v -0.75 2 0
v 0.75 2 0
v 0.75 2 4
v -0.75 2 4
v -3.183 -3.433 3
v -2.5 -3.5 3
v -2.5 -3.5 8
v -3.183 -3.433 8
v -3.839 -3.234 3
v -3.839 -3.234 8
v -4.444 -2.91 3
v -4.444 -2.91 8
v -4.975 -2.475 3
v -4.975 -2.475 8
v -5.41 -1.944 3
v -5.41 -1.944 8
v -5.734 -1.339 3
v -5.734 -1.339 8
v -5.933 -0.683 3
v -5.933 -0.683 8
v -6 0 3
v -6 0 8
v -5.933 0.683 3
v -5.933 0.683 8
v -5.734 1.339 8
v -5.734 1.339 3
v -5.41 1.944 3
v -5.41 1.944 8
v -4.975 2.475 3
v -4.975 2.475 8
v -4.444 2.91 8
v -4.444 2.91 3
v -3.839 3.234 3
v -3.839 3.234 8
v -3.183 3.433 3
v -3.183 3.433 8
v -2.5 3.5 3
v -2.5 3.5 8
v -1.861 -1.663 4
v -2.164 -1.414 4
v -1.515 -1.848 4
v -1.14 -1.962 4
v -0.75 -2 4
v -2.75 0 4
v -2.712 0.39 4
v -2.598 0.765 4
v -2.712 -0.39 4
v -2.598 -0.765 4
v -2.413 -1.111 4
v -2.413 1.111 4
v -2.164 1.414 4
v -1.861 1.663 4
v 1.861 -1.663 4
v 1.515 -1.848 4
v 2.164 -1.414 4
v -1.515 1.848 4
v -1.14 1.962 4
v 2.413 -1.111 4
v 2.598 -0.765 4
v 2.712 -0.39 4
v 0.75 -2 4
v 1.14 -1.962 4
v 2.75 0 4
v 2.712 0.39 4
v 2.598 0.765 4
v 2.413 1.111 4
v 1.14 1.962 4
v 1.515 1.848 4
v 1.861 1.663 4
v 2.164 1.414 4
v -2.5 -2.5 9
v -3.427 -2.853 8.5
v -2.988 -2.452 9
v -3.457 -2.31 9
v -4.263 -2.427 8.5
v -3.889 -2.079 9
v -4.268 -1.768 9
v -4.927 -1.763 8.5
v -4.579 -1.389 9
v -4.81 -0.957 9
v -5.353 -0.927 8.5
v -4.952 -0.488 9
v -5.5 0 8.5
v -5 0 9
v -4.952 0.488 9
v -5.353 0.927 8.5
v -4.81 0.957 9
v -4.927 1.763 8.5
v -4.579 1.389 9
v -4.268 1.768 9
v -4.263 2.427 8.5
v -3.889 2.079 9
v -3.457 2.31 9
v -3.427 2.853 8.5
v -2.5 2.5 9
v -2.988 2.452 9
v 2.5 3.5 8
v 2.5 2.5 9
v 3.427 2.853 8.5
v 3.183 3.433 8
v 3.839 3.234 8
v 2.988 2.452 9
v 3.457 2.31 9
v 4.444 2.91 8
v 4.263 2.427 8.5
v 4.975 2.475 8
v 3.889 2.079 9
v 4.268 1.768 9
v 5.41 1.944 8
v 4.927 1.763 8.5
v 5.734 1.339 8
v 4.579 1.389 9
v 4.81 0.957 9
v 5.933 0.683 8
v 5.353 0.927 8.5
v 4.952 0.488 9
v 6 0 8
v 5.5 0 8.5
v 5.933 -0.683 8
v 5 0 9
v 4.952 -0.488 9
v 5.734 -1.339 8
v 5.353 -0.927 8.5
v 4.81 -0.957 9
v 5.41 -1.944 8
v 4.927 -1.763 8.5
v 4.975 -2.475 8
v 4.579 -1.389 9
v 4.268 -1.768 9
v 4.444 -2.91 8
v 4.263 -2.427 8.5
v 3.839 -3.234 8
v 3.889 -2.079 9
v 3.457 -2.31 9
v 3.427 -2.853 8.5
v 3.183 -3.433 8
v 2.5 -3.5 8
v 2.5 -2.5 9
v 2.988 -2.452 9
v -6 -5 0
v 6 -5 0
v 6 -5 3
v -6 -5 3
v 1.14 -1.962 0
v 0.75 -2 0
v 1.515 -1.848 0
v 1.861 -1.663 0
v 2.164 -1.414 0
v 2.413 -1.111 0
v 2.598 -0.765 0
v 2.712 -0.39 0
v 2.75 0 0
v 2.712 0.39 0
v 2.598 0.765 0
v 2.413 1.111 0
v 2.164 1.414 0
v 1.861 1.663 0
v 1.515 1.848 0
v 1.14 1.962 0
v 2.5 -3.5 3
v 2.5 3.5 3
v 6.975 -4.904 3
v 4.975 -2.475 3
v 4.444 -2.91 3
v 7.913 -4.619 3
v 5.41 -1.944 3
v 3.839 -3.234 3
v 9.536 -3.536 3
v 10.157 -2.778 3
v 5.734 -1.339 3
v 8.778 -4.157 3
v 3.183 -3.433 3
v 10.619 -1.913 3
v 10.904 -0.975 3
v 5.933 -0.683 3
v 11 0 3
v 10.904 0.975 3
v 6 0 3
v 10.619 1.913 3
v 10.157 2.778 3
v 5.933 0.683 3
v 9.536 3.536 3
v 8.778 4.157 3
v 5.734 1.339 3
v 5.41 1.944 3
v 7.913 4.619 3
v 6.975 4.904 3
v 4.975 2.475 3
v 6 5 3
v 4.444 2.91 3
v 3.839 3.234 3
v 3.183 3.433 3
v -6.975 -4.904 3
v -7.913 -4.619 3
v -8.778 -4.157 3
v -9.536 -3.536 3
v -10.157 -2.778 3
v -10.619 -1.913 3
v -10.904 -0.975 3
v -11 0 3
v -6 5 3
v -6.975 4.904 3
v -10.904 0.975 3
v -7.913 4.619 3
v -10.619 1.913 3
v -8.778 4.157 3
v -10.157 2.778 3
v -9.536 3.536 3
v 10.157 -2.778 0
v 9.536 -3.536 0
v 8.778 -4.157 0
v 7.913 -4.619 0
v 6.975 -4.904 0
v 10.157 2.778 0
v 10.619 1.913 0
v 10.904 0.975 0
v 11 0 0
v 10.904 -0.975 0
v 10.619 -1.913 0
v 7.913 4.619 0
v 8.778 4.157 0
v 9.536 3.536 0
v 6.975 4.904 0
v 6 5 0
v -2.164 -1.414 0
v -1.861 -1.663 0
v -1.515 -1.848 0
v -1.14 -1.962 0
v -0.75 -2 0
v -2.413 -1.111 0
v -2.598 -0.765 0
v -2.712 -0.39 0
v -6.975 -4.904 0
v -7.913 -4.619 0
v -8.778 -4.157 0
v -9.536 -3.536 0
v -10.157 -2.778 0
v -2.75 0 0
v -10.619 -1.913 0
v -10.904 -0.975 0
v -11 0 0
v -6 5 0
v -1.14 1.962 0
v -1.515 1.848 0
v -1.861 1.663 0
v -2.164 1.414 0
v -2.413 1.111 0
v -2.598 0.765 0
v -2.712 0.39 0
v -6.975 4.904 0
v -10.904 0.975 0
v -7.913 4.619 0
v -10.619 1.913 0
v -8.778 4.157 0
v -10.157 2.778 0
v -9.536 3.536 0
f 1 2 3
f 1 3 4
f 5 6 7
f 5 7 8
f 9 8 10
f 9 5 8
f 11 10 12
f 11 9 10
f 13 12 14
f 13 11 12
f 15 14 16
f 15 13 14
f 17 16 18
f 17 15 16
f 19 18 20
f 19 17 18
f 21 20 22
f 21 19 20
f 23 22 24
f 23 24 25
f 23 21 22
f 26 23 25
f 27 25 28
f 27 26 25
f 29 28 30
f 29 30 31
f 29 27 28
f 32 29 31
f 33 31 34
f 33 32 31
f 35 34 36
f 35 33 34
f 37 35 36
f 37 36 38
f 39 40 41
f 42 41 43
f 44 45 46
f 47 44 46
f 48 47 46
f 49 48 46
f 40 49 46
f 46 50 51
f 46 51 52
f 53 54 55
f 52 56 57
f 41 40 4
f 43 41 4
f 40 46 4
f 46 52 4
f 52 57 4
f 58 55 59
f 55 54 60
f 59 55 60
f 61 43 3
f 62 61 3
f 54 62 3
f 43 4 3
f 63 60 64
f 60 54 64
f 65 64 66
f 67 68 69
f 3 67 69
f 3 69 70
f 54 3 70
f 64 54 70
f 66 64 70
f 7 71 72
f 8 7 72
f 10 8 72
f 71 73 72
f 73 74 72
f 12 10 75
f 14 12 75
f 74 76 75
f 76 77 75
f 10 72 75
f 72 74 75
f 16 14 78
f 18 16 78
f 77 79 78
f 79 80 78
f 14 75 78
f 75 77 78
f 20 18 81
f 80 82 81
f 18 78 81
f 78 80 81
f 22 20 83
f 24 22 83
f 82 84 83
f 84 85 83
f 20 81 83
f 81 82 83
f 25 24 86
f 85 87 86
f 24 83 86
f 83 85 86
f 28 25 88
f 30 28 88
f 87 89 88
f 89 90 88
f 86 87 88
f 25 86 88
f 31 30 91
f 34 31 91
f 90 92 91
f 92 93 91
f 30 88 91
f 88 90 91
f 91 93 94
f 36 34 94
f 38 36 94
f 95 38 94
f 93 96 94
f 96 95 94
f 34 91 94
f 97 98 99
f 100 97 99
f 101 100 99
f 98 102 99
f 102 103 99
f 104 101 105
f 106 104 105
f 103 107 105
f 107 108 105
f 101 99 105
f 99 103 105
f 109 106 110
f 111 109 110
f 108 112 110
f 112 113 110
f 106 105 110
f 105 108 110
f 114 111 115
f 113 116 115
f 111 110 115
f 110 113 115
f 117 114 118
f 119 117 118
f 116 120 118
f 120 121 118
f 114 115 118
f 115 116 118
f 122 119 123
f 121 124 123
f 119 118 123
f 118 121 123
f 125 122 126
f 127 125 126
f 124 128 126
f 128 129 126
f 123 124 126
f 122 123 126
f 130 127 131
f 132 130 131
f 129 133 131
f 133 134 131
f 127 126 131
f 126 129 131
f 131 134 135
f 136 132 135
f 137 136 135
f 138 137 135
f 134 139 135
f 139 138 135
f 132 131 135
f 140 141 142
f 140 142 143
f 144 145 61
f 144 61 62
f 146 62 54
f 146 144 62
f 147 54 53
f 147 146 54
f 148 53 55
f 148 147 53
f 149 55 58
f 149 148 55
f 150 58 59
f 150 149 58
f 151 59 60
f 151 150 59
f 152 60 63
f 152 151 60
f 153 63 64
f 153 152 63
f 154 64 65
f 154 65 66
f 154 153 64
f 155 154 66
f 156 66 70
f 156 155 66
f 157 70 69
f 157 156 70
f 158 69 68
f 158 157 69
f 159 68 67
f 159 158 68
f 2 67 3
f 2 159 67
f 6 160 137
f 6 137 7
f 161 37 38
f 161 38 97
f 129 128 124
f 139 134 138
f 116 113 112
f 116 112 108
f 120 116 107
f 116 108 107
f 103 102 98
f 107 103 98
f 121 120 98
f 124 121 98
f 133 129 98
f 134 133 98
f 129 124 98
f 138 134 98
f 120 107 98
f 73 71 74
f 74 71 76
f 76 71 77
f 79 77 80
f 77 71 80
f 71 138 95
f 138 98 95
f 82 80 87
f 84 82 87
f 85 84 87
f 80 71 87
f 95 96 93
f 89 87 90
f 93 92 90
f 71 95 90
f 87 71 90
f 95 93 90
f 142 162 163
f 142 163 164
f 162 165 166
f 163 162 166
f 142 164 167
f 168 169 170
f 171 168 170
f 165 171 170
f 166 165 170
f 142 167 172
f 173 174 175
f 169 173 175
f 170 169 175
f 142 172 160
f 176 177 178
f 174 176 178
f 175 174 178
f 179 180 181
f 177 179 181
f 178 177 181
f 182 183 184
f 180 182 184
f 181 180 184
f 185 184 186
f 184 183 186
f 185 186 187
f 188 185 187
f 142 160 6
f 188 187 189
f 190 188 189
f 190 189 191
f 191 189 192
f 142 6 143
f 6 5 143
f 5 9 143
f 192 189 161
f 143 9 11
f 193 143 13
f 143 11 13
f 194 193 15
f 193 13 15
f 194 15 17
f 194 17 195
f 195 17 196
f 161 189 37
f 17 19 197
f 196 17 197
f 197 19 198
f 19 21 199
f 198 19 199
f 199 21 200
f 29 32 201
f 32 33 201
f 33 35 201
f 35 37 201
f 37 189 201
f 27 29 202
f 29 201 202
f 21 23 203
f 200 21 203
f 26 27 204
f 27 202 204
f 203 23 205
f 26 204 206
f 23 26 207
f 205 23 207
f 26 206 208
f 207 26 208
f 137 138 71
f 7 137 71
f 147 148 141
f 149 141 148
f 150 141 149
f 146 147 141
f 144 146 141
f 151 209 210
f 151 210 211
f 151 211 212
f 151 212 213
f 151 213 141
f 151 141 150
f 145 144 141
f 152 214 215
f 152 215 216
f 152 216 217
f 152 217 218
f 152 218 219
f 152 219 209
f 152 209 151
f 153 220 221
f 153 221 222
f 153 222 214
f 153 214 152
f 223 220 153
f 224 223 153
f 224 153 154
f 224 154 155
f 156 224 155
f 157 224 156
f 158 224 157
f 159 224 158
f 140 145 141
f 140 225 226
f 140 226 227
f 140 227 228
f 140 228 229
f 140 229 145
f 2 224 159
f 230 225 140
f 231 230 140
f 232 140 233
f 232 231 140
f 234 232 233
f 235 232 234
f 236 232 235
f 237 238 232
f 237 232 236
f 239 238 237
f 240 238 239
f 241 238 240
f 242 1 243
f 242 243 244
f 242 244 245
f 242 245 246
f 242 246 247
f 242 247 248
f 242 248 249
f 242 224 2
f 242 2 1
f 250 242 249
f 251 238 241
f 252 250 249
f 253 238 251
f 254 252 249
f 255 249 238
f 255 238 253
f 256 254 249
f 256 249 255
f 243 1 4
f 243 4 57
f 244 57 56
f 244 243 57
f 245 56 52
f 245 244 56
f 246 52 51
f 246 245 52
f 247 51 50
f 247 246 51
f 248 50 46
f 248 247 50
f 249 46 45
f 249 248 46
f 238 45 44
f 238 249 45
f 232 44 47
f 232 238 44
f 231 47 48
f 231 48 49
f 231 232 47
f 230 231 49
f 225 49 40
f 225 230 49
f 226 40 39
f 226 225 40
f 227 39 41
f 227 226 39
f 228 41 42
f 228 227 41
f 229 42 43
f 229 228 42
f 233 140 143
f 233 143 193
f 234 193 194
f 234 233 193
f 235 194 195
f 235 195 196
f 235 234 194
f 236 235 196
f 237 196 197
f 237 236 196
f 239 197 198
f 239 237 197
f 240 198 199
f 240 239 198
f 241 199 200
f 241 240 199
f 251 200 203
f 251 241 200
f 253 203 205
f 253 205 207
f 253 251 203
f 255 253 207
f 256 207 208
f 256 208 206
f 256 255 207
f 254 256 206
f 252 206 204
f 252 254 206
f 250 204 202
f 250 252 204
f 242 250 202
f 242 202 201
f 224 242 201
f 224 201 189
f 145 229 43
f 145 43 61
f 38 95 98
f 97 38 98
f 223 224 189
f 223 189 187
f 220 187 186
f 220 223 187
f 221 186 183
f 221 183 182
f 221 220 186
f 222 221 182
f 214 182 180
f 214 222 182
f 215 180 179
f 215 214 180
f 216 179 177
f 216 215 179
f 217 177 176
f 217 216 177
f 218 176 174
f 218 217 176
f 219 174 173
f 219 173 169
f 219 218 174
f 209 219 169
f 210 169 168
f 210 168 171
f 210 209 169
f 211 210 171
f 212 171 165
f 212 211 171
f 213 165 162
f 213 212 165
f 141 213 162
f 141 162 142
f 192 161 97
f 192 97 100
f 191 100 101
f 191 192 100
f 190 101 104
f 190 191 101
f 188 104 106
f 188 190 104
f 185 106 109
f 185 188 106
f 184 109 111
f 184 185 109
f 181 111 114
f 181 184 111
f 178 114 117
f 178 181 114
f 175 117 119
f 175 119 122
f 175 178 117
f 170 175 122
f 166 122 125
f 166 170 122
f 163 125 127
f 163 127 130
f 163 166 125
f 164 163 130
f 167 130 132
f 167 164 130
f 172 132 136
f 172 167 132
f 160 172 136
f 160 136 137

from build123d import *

# Parameters (mm, degrees)
EXTRUDE_1_DEPTH     = 3
EXTRUDE_2_DEPTH     = 6
CUT_EXTRUDE_1_DEPTH = 4
CHAMFER_1_SIZE      = 1


with BuildPart() as part:
    # Эскиз1 → Бобышка-Вытянуть1 (new body)
    with BuildSketch(Plane.XY):
        with BuildLine():
            Line((-6, 5), (6, 5))
            ThreePointArc((6, 5), (11, 0), (6, -5))
            Line((6, -5), (-6, -5))
            ThreePointArc((-6, -5), (-11, 0), (-6, 5))
        make_face()
    extrude(amount=EXTRUDE_1_DEPTH)

    # Эскиз2 → Бобышка-Вытянуть2 (add)
    with BuildSketch(Plane.XY.offset(3)):
        with BuildLine():
            Line((-2.5, 3.5), (2.5, 3.5))
            ThreePointArc((2.5, 3.5), (6, 0), (2.5, -3.5))
            Line((2.5, -3.5), (-2.5, -3.5))
            ThreePointArc((-2.5, -3.5), (-6, 0), (-2.5, 3.5))
        make_face()
    extrude(amount=EXTRUDE_2_DEPTH)

    # Эскиз3 → Вырез-Вытянуть1 (cut)
    with BuildSketch(Plane(origin=(0, 0, 0), x_dir=(-1, 0, 0), z_dir=(0, 0, -1))):
        with BuildLine():
            Line((0.75, -2), (-0.75, -2))
            ThreePointArc((-0.75, -2), (-2.75, 0), (-0.75, 2))
            Line((-0.75, 2), (0.75, 2))
            ThreePointArc((0.75, 2), (2.75, 0), (0.75, -2))
        make_face()
    extrude(amount=-CUT_EXTRUDE_1_DEPTH, mode=Mode.SUBTRACT)

    # Фаска1
    chamfer_1_edges = [part.edges().sort_by_distance(p)[0] for p in [
        (-6, 0, 9),
        (0, -3.5, 9),
        (6, 0, 9),
        (0, 3.5, 9),
    ]]
    chamfer(chamfer_1_edges, length=CHAMFER_1_SIZE)


solid = part.part
